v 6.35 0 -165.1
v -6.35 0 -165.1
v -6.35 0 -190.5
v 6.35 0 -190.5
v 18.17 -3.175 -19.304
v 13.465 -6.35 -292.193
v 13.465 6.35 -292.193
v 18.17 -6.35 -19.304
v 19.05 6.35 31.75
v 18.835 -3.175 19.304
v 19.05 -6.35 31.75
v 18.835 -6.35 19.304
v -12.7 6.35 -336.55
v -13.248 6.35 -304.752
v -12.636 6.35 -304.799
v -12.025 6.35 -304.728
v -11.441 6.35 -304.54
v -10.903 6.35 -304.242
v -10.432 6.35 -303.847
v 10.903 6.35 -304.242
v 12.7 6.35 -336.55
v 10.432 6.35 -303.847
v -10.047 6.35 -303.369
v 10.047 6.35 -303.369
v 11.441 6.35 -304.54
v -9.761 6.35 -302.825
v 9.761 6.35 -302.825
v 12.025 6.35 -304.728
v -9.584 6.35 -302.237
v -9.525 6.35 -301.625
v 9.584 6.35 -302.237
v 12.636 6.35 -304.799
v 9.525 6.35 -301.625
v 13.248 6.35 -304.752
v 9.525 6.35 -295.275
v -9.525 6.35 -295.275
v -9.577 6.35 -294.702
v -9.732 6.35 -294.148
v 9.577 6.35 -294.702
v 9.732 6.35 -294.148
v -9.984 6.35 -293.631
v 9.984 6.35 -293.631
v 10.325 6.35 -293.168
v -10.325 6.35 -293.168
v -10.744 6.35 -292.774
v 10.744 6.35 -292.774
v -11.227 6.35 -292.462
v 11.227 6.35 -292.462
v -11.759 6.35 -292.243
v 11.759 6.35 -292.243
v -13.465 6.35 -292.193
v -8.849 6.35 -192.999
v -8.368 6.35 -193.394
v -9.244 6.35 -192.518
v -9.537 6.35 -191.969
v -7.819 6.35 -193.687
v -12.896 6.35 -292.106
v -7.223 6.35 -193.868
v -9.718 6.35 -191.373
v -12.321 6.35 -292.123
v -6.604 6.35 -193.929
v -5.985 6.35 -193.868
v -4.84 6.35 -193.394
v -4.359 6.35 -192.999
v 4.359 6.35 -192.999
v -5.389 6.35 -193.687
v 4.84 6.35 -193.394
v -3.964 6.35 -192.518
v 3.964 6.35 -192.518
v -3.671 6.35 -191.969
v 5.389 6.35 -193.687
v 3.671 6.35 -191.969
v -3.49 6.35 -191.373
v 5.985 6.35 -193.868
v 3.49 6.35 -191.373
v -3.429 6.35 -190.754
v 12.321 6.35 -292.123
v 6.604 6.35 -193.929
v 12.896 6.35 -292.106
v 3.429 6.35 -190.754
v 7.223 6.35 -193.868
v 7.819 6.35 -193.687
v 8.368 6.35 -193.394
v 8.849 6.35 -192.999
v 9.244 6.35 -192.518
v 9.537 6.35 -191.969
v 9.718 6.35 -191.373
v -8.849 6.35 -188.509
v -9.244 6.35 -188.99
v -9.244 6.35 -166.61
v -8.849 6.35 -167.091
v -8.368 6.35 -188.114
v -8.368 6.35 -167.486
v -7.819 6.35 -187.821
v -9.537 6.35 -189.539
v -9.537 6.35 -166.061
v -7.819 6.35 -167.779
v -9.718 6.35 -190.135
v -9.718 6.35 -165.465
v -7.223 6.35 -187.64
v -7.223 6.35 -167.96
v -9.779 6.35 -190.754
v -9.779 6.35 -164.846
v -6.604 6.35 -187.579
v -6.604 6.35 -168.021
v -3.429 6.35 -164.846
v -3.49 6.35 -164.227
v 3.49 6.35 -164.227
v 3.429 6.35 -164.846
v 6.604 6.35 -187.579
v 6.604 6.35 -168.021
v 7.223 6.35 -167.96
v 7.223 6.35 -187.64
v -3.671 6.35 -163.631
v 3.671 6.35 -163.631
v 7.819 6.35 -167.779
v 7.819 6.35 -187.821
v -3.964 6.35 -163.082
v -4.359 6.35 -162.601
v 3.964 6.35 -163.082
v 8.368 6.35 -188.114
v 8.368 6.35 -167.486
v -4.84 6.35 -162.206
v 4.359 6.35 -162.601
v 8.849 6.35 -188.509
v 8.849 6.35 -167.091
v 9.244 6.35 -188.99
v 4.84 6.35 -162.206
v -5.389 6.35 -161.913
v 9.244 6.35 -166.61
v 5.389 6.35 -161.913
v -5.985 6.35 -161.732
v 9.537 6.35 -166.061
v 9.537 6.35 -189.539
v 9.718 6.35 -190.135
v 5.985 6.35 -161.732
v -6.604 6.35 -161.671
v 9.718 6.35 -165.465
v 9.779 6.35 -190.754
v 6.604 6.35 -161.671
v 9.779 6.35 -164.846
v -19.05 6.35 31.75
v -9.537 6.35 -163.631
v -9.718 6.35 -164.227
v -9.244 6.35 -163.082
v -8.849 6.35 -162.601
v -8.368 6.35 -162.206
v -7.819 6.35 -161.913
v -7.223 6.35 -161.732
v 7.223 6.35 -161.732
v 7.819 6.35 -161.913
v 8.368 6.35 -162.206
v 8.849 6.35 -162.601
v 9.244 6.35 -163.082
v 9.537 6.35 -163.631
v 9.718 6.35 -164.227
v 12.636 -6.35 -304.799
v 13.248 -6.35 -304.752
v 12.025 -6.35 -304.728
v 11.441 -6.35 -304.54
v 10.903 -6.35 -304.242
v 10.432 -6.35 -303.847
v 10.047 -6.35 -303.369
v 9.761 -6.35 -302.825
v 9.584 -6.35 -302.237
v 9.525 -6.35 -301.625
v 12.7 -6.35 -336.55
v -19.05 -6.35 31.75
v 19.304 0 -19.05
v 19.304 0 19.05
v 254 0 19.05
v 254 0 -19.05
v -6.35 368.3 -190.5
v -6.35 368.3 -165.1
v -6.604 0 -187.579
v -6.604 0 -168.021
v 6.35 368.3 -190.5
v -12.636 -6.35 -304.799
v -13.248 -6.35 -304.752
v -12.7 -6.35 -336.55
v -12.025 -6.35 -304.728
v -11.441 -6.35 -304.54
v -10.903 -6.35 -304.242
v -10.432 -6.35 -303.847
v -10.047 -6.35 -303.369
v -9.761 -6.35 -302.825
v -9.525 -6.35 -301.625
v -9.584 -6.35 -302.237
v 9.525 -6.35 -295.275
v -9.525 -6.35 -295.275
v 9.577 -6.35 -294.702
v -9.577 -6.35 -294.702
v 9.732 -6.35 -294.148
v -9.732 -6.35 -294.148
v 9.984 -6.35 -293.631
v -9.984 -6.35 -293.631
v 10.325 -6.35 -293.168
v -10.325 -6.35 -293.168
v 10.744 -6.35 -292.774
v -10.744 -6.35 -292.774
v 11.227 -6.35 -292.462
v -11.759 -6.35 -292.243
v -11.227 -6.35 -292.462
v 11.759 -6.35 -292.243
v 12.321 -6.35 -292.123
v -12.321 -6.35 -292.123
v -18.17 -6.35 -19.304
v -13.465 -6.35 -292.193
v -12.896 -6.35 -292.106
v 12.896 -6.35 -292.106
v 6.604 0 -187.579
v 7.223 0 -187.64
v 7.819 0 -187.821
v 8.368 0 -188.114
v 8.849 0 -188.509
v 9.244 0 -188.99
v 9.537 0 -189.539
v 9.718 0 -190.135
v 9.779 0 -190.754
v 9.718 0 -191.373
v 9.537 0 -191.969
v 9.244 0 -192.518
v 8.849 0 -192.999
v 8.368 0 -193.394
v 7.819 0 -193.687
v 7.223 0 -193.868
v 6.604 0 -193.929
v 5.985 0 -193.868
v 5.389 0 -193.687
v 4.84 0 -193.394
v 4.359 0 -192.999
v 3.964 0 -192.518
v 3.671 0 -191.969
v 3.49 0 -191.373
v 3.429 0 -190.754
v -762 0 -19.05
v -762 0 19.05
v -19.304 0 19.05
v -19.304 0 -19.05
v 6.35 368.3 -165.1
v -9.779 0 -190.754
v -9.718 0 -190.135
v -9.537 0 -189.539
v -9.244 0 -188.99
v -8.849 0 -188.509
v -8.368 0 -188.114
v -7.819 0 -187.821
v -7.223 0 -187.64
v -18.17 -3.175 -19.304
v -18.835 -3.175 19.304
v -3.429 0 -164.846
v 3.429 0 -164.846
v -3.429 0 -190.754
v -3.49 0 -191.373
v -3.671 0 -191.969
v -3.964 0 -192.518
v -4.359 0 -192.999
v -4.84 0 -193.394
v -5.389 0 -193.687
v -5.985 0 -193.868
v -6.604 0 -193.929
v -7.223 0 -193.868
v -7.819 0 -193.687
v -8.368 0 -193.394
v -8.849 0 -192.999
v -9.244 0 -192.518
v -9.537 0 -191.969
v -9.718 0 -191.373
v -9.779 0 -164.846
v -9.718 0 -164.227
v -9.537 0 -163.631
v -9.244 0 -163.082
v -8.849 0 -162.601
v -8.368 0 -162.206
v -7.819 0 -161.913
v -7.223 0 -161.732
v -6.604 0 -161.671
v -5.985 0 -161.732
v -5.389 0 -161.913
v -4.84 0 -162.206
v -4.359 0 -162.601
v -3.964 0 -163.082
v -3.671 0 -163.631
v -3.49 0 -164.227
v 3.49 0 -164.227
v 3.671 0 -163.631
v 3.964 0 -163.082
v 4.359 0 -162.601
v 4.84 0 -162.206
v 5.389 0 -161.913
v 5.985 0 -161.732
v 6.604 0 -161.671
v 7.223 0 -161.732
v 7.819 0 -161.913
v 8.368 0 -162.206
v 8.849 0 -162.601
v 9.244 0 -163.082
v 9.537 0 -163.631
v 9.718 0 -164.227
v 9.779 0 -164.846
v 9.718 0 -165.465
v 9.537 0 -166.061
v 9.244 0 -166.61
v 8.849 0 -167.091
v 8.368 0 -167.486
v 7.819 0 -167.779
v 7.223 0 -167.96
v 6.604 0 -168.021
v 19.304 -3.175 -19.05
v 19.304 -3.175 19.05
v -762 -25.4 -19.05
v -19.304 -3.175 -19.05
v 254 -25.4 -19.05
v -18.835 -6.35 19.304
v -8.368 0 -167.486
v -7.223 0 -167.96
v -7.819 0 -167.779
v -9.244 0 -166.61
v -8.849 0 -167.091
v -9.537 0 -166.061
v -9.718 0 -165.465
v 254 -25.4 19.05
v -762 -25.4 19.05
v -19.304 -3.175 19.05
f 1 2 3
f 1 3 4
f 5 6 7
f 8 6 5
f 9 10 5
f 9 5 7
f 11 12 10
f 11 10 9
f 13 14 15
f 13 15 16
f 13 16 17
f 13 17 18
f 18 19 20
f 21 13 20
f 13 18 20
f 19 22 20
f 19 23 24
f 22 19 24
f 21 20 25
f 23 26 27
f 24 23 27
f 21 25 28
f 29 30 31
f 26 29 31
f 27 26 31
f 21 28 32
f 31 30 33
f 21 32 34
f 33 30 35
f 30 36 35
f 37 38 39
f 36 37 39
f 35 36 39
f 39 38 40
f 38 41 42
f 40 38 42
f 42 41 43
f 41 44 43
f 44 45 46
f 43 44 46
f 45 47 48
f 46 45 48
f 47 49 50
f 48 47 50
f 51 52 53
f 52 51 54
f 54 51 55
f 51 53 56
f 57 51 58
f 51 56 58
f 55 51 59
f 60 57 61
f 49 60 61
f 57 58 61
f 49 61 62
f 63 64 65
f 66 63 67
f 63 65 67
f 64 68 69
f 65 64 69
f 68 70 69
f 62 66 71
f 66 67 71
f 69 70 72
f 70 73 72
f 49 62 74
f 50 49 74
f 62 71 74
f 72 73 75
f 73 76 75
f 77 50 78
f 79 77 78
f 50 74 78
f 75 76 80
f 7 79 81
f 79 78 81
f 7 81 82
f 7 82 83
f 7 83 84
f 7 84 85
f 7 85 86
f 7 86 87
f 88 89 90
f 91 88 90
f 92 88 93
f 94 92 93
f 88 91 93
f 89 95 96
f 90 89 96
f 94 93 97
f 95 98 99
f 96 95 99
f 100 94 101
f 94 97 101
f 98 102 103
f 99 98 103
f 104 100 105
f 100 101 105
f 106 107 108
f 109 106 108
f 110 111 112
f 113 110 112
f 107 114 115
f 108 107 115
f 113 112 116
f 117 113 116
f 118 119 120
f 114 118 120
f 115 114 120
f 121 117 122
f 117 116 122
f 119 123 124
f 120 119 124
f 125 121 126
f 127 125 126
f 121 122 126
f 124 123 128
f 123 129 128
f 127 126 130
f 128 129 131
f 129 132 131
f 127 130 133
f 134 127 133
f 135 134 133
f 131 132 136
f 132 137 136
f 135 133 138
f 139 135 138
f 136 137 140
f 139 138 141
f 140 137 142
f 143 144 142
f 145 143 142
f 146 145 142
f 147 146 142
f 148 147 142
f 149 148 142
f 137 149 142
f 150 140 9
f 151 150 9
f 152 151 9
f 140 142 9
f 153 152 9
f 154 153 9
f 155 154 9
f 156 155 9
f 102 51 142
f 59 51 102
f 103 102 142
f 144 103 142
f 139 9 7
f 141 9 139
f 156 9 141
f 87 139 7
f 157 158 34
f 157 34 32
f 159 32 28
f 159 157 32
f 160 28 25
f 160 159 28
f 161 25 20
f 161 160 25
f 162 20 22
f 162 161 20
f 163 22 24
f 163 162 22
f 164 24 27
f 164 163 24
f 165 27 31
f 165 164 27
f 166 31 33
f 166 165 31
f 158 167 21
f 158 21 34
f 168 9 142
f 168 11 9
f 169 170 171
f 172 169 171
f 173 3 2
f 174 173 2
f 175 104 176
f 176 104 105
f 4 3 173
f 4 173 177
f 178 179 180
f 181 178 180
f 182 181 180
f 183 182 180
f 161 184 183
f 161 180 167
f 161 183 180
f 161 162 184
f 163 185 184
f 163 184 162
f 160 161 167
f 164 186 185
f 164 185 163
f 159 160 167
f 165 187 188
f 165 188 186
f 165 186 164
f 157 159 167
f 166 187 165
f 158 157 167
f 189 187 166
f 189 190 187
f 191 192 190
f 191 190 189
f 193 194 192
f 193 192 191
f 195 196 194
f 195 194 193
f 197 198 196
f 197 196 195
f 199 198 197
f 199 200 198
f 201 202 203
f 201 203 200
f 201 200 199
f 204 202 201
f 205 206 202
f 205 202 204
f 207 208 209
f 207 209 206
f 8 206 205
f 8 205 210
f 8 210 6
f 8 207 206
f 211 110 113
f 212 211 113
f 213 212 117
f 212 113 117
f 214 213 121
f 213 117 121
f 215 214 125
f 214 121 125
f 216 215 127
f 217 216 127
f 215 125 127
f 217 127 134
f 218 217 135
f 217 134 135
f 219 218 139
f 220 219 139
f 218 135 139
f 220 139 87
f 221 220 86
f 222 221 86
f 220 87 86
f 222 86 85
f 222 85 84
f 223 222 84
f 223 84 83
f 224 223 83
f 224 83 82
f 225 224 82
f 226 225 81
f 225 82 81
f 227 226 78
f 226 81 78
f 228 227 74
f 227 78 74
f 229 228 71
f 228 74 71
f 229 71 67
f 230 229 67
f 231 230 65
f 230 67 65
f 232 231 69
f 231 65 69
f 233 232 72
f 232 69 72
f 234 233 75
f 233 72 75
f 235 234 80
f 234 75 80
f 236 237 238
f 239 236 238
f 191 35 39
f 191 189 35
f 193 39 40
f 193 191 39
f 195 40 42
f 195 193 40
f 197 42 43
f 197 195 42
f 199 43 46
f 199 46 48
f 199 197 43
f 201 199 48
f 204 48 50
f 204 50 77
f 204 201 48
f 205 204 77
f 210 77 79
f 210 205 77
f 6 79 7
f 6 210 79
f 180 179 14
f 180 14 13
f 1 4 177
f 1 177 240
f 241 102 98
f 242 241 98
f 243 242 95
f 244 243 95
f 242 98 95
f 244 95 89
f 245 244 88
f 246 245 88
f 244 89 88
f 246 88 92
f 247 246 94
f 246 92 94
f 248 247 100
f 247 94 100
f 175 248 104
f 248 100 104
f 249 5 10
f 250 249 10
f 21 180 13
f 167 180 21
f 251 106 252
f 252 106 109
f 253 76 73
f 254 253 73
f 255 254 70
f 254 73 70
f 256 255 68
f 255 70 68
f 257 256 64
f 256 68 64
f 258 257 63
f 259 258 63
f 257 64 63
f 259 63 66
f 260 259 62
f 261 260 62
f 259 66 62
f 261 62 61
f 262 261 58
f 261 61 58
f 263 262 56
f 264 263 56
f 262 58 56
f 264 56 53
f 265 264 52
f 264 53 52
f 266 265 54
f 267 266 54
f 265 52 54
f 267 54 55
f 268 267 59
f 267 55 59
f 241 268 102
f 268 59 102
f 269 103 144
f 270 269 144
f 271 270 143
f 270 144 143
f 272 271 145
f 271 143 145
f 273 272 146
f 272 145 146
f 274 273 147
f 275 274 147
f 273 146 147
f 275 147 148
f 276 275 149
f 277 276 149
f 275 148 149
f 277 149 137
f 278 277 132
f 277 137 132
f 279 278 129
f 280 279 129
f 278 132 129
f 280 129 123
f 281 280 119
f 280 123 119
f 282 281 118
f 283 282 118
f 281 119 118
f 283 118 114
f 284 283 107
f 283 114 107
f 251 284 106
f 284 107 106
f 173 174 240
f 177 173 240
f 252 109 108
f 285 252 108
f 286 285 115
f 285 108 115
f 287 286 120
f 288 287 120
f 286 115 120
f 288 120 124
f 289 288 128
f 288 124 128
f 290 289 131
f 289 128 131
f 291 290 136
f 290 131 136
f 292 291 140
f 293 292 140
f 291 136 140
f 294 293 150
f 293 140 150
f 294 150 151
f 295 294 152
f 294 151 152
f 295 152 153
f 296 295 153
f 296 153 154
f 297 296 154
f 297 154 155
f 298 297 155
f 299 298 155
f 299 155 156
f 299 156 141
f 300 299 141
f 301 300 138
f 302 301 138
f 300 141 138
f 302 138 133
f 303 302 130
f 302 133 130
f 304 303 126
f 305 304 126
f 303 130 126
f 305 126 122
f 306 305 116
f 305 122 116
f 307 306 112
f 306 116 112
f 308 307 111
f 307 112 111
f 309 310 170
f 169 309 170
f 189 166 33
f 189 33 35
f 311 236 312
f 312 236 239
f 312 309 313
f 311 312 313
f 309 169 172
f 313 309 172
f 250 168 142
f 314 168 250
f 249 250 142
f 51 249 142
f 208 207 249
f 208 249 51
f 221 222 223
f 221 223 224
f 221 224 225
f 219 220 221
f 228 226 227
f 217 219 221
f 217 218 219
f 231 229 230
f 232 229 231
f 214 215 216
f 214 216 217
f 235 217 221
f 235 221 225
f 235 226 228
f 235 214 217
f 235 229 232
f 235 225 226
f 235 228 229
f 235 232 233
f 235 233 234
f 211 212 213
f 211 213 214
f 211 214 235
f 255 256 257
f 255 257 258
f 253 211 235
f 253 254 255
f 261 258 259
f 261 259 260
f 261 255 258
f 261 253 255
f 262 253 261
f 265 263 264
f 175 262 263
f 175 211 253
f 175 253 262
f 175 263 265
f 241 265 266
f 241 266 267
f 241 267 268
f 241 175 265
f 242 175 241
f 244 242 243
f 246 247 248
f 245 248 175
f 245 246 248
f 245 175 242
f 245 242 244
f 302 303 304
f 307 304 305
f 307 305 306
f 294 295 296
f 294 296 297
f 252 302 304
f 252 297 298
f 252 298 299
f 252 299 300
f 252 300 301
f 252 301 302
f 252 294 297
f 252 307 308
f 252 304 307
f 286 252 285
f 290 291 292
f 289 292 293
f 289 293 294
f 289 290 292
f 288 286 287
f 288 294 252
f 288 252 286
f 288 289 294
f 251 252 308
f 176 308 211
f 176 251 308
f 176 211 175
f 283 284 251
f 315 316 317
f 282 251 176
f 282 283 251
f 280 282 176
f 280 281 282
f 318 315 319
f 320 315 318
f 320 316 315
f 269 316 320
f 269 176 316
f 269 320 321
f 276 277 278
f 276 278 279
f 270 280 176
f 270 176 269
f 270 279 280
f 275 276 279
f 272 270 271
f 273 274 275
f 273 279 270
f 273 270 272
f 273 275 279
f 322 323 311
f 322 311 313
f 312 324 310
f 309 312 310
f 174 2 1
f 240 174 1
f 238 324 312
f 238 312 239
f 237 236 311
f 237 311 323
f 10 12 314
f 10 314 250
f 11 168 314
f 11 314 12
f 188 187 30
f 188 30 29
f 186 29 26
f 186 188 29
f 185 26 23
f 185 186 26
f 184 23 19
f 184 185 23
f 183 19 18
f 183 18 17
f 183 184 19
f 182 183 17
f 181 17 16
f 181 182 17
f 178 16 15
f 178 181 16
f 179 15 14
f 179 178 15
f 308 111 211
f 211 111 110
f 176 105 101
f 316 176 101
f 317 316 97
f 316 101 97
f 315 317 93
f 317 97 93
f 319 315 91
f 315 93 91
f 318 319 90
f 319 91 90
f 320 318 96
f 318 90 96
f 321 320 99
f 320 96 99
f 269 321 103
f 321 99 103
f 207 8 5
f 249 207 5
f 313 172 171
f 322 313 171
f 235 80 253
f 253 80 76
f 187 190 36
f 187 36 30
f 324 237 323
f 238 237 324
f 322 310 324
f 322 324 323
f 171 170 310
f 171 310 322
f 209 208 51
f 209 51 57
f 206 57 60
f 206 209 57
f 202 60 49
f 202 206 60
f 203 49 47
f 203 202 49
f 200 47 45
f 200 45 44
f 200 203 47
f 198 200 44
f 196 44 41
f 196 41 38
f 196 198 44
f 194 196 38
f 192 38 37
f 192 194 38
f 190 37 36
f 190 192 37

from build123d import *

# Parameters (mm, degrees)
F1_DEPTH  = 6.35
F2_W      = 1016
F2_H      = 38.1
F3_DEPTH  = 25.4
F4_W      = 38.608
F4_H      = 3.175
F5_DEPTH  = 38.1
F6_W      = 3.175
F6_H      = 38.608
F7_DEPTH  = 19.05
F8_W      = 12.7
F8_H      = 25.4
F9_DEPTH  = 368.3
F11_DEPTH = 6.35


with BuildPart() as f1:
    # F0 (on Front) → F1 (new body, symmetric)
    with BuildSketch(Plane.XZ):
        with BuildLine():
            Line((19.05, 31.75), (-19.05, 31.75))
            Line((-19.05, 31.75), (-13.4647675584, -292.193481611))
            ThreePointArc((-13.4647675584, -292.193481611), (-10.7439212692, -292.7741239537), (-9.525, -295.275))
            Line((-9.525, -295.275), (-9.525, -301.625))
            ThreePointArc((-9.525, -301.625), (-10.6579452087, -304.0561802132), (-13.2482360499, -304.7523091043))
            Line((-13.2482360499, -304.7523091043), (-12.7, -336.55))
            Line((-12.7, -336.55), (12.7, -336.55))
            Line((12.7, -336.55), (13.2482360499, -304.7523091043))
            ThreePointArc((13.2482360499, -304.7523091043), (10.6579452087, -304.0561802132), (9.525, -301.625))
            Line((9.525, -301.625), (9.525, -295.275))
            ThreePointArc((9.525, -295.275), (10.7439212692, -292.7741239537), (13.4647675584, -292.193481611))
            Line((13.4647675584, -292.193481611), (19.05, 31.75))
        make_face()
    extrude(amount=F1_DEPTH, both=True)

    # F6 (on Right) → F7 (cut, symmetric)
    with BuildSketch(Plane.YZ):
        with Locations((-4.7625, 0)):
            Rectangle(F6_W, F6_H)
    extrude(amount=F7_DEPTH, both=True, mode=Mode.SUBTRACT)

    # F10 (on face) → F11 (cut)
    with BuildSketch(Plane(origin=(0, 6.35, 0), x_dir=(-1, 0, 0), z_dir=(0, 1, 0))):
        with BuildLine():
            ThreePointArc((-6.604, -168.021), (-4.3589359697, -167.0910640303), (-3.429, -164.846))
            Line((-3.429, -164.846), (-6.604, -164.846))
            Line((-6.604, -164.846), (-6.604, -168.021))
        make_face()
        with BuildLine():
            Line((-6.604, -164.846), (-3.429, -164.846))
            ThreePointArc((-3.429, -164.846), (-8.8490640303, -162.6009359697), (-6.604, -168.021))
            Line((-6.604, -168.021), (-6.604, -164.846))
        make_face()
        with BuildLine():
            Line((3.429, -164.846), (-3.429, -164.846))
            ThreePointArc((-3.429, -164.846), (-4.3589359697, -167.0910640303), (-6.604, -168.021))
            Line((-6.604, -168.021), (-6.604, -187.579))
            ThreePointArc((-6.604, -187.579), (-4.3589359697, -188.5089359697), (-3.429, -190.754))
            Line((-3.429, -190.754), (3.429, -190.754))
            ThreePointArc((3.429, -190.754), (4.3589359697, -188.5089359697), (6.604, -187.579))
            Line((6.604, -187.579), (6.604, -168.021))
            ThreePointArc((6.604, -168.021), (4.3589359697, -167.0910640303), (3.429, -164.846))
        make_face()
        with BuildLine():
            ThreePointArc((9.779, -164.846), (6.604, -161.671), (3.429, -164.846))
            Line((3.429, -164.846), (6.604, -164.846))
            Line((6.604, -164.846), (6.604, -168.021))
            ThreePointArc((6.604, -168.021), (8.8490640303, -167.0910640303), (9.779, -164.846))
        make_face()
        with BuildLine():
            Line((6.604, -164.846), (3.429, -164.846))
            ThreePointArc((3.429, -164.846), (4.3589359697, -167.0910640303), (6.604, -168.021))
            Line((6.604, -168.021), (6.604, -164.846))
        make_face()
        with BuildLine():
            ThreePointArc((-3.429, -190.754), (-4.3589359697, -188.5089359697), (-6.604, -187.579))
            Line((-6.604, -187.579), (-6.604, -190.754))
            Line((-6.604, -190.754), (-3.429, -190.754))
        make_face()
        with BuildLine():
            Line((-6.604, -190.754), (-6.604, -187.579))
            ThreePointArc((-6.604, -187.579), (-8.8490640303, -192.9990640303), (-3.429, -190.754))
            Line((-3.429, -190.754), (-6.604, -190.754))
        make_face()
        with BuildLine():
            ThreePointArc((9.779, -190.754), (8.8490640303, -188.5089359697), (6.604, -187.579))
            Line((6.604, -187.579), (6.604, -190.754))
            Line((6.604, -190.754), (3.429, -190.754))
            ThreePointArc((3.429, -190.754), (6.604, -193.929), (9.779, -190.754))
        make_face()
        with BuildLine():
            Line((6.604, -190.754), (6.604, -187.579))
            ThreePointArc((6.604, -187.579), (4.3589359697, -188.5089359697), (3.429, -190.754))
            Line((3.429, -190.754), (6.604, -190.754))
        make_face()
    extrude(amount=-F11_DEPTH, mode=Mode.SUBTRACT)


with BuildPart() as f3:
    # F2 (on Front) → F3 (new body)
    with BuildSketch(Plane.XZ):
        with Locations((-254, 0)):
            Rectangle(F2_W, F2_H)
    extrude(amount=F3_DEPTH)

    # F4 (on face) → F5 (cut, through all)
    with BuildSketch(Plane.XY.offset(19.05)):
        with Locations((0, -1.5875)):
            Rectangle(F4_W, F4_H)
    extrude(amount=-F5_DEPTH, mode=Mode.SUBTRACT)


with BuildPart() as f9:
    # F8 (on Front) → F9 (new body)
    with BuildSketch(Plane.XZ):
        with Locations((0, -177.8)):
            Rectangle(F8_W, F8_H)
    extrude(amount=-F9_DEPTH)


solid = Compound([f1.part, f3.part, f9.part])
